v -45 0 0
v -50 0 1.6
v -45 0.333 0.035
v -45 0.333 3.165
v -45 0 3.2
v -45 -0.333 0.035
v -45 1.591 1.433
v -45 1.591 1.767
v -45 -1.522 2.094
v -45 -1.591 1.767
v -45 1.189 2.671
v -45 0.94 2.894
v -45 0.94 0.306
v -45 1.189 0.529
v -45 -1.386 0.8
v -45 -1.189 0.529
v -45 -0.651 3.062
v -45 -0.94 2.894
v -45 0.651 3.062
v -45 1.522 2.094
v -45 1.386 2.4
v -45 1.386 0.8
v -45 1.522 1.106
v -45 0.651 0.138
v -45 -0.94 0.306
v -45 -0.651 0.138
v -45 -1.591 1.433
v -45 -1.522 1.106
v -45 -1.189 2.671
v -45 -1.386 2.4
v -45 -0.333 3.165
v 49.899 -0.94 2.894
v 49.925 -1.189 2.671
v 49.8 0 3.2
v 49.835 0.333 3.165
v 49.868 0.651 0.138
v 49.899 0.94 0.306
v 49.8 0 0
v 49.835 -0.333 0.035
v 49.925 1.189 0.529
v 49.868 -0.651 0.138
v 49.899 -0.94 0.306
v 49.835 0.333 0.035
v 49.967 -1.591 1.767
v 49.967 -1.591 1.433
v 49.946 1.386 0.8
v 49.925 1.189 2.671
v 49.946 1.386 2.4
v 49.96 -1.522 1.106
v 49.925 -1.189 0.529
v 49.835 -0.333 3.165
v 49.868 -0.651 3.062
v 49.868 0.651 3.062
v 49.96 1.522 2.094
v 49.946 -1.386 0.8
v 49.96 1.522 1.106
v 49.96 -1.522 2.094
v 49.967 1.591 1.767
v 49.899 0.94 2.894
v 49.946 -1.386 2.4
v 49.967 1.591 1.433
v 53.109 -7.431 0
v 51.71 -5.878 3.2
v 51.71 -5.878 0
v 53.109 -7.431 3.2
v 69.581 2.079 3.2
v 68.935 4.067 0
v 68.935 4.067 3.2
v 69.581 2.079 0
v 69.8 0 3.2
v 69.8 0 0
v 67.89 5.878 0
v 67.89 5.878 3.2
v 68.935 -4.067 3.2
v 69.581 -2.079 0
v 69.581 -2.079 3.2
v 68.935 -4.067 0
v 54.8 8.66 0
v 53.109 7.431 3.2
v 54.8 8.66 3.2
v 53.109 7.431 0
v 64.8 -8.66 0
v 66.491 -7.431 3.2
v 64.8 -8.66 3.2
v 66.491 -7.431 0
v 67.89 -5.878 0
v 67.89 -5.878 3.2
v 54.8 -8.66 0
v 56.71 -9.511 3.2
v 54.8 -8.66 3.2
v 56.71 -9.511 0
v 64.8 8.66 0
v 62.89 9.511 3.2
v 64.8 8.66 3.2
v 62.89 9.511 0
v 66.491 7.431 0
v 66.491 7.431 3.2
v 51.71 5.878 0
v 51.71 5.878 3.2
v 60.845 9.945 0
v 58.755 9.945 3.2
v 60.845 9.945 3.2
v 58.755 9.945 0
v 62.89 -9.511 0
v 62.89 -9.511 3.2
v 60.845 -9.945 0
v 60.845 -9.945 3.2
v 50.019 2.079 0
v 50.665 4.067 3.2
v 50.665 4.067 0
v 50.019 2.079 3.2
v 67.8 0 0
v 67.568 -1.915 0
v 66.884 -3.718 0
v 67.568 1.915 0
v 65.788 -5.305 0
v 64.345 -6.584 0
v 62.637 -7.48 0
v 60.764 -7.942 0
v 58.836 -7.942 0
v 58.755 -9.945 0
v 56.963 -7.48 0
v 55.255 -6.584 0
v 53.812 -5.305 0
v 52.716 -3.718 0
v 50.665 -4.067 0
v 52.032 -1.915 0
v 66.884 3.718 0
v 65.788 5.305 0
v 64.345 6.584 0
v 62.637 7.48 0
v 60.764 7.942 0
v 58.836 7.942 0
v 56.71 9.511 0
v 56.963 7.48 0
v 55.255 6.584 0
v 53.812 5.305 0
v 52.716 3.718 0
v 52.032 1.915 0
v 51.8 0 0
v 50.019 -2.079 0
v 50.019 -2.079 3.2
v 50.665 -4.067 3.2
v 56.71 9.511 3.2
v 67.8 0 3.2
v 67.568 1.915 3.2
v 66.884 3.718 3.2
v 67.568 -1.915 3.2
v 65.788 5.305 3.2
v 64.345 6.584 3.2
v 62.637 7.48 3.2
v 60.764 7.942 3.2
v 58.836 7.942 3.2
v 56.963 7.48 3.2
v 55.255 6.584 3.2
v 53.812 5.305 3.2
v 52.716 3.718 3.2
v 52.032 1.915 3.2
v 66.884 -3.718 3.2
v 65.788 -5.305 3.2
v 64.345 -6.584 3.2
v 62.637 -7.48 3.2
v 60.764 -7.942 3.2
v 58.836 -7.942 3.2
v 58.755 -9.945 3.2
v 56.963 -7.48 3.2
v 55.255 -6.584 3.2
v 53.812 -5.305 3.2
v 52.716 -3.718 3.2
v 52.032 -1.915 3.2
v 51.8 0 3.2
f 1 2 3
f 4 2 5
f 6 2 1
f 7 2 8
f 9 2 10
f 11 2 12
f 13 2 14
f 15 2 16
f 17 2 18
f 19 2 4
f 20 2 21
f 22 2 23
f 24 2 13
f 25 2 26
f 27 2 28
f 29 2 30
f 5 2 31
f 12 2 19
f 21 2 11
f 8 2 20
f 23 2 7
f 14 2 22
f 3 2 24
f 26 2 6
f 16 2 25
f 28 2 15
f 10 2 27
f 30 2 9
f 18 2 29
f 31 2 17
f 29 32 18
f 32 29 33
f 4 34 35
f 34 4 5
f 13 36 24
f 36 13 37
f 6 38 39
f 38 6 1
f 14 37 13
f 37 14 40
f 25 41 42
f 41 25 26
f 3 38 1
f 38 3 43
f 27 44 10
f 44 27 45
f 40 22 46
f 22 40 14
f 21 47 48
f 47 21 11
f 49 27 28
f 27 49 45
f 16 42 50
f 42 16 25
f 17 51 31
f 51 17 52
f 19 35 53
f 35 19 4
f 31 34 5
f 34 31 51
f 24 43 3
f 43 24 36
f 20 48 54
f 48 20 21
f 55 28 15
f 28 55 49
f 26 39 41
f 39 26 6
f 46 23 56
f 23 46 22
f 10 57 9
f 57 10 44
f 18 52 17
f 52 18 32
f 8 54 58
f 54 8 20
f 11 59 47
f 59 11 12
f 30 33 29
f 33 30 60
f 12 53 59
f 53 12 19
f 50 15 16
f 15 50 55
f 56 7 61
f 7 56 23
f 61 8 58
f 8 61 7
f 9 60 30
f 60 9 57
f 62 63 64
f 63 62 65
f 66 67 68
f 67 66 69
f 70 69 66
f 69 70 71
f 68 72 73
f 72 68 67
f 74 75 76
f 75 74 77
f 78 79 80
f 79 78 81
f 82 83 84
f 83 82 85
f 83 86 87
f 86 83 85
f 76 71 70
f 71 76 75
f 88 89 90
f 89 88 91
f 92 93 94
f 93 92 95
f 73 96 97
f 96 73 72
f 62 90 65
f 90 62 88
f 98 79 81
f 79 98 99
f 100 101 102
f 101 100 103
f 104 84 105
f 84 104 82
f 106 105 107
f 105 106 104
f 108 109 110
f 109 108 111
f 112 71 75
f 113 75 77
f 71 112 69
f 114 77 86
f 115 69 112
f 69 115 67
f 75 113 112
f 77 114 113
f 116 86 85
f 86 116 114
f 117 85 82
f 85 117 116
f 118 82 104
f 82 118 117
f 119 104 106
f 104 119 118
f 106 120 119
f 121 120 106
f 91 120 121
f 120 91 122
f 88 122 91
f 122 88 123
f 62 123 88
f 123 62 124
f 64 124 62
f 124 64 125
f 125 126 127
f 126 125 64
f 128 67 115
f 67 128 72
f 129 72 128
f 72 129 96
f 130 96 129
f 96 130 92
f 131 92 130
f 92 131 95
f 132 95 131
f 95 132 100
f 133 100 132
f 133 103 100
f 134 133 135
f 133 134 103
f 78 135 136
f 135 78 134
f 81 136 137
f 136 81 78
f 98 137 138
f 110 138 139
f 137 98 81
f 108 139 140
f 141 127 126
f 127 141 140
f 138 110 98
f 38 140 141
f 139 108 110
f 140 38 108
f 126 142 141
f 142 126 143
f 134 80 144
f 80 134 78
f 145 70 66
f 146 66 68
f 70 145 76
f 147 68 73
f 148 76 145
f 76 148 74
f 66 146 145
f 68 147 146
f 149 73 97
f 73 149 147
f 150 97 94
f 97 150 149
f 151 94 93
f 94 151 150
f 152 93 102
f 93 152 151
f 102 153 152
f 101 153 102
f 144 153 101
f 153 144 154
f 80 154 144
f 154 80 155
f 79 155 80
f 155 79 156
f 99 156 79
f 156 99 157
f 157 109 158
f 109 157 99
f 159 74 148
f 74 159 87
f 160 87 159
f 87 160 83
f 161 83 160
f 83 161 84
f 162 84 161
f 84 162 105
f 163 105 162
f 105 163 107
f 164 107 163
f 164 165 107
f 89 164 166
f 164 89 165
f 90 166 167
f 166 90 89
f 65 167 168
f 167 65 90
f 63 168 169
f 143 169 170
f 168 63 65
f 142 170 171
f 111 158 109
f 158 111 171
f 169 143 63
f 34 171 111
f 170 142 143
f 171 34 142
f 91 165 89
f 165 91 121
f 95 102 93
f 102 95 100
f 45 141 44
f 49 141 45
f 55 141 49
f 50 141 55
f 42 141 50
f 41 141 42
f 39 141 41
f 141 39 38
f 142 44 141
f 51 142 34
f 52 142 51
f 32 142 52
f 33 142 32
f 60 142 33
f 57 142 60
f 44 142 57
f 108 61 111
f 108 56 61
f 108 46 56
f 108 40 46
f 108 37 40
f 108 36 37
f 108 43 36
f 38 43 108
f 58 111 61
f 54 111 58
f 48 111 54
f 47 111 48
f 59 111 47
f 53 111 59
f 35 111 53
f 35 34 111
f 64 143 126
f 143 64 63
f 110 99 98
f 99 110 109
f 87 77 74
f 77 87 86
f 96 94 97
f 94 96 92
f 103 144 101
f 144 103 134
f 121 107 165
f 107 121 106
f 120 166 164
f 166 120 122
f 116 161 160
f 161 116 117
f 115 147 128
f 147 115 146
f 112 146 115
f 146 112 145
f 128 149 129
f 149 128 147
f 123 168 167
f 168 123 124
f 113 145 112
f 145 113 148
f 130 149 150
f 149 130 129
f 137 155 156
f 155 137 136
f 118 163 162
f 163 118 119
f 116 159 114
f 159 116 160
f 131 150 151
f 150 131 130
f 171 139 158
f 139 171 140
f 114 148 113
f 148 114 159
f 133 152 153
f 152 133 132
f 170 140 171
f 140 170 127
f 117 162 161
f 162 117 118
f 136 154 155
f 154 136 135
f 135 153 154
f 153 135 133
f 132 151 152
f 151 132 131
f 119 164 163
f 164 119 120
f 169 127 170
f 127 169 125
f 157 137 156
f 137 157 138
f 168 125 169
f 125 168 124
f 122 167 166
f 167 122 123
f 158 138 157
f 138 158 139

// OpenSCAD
// [FL_INDEX: keywords="openscad, 3d_parametric, Round_cocktail_stick, csg_solid" | COT="Parametric OpenSCAD design from 3DCodeverse"]
// Title: Round cocktail stick

//
// Straight cocktail stick with round, pointed stick
//
// The "ornament" is just a ring 
//
// by Egil Kvaleberg
//

//*****************************************************************************
// Adjustables

// length of stick
total_length = 100;

// length of cone section
cone_length = 5; 

// diameter of stick
stick_diameter = 3.2;

// size of ornament
ornament_size = 20;

// thickness of ornament
ornament_thickness = 2;

stick_fs = 1*0.1;
ornament_fs = 1*0.5;

//*****************************************************************************
// Derived

stick_radius = stick_diameter / 2;
stick_length = total_length - cone_length;

//*****************************************************************************
// View and printing

view(); 

//*****************************************************************************
// 

module cone()
{
    rotate([0, 90, 0]) cylinder(r1 = 0, r2 = stick_radius, h = cone_length, $fs = stick_fs);
}

module stick()
{
    translate([cone_length, 0, 0]) rotate([0, 90, 0]) cylinder(r = stick_radius, h = stick_length, $fs =stick_fs);
}

module ornament()
{
    difference() {
        cylinder(r = ornament_size/2, h = stick_diameter);
        translate([0, 0, -stick_diameter/2]) cylinder(r = ornament_size/2 - ornament_thickness, h = stick_diameter*2);
    }
}

module view()
{
     translate([-total_length/2, 0, stick_radius]) {
         cone();
         stick();
    }
    translate([total_length/2 + ornament_size/2 - 0.2, 0, 0]) {     
        ornament();
    }
}

//*****************************************************************************
